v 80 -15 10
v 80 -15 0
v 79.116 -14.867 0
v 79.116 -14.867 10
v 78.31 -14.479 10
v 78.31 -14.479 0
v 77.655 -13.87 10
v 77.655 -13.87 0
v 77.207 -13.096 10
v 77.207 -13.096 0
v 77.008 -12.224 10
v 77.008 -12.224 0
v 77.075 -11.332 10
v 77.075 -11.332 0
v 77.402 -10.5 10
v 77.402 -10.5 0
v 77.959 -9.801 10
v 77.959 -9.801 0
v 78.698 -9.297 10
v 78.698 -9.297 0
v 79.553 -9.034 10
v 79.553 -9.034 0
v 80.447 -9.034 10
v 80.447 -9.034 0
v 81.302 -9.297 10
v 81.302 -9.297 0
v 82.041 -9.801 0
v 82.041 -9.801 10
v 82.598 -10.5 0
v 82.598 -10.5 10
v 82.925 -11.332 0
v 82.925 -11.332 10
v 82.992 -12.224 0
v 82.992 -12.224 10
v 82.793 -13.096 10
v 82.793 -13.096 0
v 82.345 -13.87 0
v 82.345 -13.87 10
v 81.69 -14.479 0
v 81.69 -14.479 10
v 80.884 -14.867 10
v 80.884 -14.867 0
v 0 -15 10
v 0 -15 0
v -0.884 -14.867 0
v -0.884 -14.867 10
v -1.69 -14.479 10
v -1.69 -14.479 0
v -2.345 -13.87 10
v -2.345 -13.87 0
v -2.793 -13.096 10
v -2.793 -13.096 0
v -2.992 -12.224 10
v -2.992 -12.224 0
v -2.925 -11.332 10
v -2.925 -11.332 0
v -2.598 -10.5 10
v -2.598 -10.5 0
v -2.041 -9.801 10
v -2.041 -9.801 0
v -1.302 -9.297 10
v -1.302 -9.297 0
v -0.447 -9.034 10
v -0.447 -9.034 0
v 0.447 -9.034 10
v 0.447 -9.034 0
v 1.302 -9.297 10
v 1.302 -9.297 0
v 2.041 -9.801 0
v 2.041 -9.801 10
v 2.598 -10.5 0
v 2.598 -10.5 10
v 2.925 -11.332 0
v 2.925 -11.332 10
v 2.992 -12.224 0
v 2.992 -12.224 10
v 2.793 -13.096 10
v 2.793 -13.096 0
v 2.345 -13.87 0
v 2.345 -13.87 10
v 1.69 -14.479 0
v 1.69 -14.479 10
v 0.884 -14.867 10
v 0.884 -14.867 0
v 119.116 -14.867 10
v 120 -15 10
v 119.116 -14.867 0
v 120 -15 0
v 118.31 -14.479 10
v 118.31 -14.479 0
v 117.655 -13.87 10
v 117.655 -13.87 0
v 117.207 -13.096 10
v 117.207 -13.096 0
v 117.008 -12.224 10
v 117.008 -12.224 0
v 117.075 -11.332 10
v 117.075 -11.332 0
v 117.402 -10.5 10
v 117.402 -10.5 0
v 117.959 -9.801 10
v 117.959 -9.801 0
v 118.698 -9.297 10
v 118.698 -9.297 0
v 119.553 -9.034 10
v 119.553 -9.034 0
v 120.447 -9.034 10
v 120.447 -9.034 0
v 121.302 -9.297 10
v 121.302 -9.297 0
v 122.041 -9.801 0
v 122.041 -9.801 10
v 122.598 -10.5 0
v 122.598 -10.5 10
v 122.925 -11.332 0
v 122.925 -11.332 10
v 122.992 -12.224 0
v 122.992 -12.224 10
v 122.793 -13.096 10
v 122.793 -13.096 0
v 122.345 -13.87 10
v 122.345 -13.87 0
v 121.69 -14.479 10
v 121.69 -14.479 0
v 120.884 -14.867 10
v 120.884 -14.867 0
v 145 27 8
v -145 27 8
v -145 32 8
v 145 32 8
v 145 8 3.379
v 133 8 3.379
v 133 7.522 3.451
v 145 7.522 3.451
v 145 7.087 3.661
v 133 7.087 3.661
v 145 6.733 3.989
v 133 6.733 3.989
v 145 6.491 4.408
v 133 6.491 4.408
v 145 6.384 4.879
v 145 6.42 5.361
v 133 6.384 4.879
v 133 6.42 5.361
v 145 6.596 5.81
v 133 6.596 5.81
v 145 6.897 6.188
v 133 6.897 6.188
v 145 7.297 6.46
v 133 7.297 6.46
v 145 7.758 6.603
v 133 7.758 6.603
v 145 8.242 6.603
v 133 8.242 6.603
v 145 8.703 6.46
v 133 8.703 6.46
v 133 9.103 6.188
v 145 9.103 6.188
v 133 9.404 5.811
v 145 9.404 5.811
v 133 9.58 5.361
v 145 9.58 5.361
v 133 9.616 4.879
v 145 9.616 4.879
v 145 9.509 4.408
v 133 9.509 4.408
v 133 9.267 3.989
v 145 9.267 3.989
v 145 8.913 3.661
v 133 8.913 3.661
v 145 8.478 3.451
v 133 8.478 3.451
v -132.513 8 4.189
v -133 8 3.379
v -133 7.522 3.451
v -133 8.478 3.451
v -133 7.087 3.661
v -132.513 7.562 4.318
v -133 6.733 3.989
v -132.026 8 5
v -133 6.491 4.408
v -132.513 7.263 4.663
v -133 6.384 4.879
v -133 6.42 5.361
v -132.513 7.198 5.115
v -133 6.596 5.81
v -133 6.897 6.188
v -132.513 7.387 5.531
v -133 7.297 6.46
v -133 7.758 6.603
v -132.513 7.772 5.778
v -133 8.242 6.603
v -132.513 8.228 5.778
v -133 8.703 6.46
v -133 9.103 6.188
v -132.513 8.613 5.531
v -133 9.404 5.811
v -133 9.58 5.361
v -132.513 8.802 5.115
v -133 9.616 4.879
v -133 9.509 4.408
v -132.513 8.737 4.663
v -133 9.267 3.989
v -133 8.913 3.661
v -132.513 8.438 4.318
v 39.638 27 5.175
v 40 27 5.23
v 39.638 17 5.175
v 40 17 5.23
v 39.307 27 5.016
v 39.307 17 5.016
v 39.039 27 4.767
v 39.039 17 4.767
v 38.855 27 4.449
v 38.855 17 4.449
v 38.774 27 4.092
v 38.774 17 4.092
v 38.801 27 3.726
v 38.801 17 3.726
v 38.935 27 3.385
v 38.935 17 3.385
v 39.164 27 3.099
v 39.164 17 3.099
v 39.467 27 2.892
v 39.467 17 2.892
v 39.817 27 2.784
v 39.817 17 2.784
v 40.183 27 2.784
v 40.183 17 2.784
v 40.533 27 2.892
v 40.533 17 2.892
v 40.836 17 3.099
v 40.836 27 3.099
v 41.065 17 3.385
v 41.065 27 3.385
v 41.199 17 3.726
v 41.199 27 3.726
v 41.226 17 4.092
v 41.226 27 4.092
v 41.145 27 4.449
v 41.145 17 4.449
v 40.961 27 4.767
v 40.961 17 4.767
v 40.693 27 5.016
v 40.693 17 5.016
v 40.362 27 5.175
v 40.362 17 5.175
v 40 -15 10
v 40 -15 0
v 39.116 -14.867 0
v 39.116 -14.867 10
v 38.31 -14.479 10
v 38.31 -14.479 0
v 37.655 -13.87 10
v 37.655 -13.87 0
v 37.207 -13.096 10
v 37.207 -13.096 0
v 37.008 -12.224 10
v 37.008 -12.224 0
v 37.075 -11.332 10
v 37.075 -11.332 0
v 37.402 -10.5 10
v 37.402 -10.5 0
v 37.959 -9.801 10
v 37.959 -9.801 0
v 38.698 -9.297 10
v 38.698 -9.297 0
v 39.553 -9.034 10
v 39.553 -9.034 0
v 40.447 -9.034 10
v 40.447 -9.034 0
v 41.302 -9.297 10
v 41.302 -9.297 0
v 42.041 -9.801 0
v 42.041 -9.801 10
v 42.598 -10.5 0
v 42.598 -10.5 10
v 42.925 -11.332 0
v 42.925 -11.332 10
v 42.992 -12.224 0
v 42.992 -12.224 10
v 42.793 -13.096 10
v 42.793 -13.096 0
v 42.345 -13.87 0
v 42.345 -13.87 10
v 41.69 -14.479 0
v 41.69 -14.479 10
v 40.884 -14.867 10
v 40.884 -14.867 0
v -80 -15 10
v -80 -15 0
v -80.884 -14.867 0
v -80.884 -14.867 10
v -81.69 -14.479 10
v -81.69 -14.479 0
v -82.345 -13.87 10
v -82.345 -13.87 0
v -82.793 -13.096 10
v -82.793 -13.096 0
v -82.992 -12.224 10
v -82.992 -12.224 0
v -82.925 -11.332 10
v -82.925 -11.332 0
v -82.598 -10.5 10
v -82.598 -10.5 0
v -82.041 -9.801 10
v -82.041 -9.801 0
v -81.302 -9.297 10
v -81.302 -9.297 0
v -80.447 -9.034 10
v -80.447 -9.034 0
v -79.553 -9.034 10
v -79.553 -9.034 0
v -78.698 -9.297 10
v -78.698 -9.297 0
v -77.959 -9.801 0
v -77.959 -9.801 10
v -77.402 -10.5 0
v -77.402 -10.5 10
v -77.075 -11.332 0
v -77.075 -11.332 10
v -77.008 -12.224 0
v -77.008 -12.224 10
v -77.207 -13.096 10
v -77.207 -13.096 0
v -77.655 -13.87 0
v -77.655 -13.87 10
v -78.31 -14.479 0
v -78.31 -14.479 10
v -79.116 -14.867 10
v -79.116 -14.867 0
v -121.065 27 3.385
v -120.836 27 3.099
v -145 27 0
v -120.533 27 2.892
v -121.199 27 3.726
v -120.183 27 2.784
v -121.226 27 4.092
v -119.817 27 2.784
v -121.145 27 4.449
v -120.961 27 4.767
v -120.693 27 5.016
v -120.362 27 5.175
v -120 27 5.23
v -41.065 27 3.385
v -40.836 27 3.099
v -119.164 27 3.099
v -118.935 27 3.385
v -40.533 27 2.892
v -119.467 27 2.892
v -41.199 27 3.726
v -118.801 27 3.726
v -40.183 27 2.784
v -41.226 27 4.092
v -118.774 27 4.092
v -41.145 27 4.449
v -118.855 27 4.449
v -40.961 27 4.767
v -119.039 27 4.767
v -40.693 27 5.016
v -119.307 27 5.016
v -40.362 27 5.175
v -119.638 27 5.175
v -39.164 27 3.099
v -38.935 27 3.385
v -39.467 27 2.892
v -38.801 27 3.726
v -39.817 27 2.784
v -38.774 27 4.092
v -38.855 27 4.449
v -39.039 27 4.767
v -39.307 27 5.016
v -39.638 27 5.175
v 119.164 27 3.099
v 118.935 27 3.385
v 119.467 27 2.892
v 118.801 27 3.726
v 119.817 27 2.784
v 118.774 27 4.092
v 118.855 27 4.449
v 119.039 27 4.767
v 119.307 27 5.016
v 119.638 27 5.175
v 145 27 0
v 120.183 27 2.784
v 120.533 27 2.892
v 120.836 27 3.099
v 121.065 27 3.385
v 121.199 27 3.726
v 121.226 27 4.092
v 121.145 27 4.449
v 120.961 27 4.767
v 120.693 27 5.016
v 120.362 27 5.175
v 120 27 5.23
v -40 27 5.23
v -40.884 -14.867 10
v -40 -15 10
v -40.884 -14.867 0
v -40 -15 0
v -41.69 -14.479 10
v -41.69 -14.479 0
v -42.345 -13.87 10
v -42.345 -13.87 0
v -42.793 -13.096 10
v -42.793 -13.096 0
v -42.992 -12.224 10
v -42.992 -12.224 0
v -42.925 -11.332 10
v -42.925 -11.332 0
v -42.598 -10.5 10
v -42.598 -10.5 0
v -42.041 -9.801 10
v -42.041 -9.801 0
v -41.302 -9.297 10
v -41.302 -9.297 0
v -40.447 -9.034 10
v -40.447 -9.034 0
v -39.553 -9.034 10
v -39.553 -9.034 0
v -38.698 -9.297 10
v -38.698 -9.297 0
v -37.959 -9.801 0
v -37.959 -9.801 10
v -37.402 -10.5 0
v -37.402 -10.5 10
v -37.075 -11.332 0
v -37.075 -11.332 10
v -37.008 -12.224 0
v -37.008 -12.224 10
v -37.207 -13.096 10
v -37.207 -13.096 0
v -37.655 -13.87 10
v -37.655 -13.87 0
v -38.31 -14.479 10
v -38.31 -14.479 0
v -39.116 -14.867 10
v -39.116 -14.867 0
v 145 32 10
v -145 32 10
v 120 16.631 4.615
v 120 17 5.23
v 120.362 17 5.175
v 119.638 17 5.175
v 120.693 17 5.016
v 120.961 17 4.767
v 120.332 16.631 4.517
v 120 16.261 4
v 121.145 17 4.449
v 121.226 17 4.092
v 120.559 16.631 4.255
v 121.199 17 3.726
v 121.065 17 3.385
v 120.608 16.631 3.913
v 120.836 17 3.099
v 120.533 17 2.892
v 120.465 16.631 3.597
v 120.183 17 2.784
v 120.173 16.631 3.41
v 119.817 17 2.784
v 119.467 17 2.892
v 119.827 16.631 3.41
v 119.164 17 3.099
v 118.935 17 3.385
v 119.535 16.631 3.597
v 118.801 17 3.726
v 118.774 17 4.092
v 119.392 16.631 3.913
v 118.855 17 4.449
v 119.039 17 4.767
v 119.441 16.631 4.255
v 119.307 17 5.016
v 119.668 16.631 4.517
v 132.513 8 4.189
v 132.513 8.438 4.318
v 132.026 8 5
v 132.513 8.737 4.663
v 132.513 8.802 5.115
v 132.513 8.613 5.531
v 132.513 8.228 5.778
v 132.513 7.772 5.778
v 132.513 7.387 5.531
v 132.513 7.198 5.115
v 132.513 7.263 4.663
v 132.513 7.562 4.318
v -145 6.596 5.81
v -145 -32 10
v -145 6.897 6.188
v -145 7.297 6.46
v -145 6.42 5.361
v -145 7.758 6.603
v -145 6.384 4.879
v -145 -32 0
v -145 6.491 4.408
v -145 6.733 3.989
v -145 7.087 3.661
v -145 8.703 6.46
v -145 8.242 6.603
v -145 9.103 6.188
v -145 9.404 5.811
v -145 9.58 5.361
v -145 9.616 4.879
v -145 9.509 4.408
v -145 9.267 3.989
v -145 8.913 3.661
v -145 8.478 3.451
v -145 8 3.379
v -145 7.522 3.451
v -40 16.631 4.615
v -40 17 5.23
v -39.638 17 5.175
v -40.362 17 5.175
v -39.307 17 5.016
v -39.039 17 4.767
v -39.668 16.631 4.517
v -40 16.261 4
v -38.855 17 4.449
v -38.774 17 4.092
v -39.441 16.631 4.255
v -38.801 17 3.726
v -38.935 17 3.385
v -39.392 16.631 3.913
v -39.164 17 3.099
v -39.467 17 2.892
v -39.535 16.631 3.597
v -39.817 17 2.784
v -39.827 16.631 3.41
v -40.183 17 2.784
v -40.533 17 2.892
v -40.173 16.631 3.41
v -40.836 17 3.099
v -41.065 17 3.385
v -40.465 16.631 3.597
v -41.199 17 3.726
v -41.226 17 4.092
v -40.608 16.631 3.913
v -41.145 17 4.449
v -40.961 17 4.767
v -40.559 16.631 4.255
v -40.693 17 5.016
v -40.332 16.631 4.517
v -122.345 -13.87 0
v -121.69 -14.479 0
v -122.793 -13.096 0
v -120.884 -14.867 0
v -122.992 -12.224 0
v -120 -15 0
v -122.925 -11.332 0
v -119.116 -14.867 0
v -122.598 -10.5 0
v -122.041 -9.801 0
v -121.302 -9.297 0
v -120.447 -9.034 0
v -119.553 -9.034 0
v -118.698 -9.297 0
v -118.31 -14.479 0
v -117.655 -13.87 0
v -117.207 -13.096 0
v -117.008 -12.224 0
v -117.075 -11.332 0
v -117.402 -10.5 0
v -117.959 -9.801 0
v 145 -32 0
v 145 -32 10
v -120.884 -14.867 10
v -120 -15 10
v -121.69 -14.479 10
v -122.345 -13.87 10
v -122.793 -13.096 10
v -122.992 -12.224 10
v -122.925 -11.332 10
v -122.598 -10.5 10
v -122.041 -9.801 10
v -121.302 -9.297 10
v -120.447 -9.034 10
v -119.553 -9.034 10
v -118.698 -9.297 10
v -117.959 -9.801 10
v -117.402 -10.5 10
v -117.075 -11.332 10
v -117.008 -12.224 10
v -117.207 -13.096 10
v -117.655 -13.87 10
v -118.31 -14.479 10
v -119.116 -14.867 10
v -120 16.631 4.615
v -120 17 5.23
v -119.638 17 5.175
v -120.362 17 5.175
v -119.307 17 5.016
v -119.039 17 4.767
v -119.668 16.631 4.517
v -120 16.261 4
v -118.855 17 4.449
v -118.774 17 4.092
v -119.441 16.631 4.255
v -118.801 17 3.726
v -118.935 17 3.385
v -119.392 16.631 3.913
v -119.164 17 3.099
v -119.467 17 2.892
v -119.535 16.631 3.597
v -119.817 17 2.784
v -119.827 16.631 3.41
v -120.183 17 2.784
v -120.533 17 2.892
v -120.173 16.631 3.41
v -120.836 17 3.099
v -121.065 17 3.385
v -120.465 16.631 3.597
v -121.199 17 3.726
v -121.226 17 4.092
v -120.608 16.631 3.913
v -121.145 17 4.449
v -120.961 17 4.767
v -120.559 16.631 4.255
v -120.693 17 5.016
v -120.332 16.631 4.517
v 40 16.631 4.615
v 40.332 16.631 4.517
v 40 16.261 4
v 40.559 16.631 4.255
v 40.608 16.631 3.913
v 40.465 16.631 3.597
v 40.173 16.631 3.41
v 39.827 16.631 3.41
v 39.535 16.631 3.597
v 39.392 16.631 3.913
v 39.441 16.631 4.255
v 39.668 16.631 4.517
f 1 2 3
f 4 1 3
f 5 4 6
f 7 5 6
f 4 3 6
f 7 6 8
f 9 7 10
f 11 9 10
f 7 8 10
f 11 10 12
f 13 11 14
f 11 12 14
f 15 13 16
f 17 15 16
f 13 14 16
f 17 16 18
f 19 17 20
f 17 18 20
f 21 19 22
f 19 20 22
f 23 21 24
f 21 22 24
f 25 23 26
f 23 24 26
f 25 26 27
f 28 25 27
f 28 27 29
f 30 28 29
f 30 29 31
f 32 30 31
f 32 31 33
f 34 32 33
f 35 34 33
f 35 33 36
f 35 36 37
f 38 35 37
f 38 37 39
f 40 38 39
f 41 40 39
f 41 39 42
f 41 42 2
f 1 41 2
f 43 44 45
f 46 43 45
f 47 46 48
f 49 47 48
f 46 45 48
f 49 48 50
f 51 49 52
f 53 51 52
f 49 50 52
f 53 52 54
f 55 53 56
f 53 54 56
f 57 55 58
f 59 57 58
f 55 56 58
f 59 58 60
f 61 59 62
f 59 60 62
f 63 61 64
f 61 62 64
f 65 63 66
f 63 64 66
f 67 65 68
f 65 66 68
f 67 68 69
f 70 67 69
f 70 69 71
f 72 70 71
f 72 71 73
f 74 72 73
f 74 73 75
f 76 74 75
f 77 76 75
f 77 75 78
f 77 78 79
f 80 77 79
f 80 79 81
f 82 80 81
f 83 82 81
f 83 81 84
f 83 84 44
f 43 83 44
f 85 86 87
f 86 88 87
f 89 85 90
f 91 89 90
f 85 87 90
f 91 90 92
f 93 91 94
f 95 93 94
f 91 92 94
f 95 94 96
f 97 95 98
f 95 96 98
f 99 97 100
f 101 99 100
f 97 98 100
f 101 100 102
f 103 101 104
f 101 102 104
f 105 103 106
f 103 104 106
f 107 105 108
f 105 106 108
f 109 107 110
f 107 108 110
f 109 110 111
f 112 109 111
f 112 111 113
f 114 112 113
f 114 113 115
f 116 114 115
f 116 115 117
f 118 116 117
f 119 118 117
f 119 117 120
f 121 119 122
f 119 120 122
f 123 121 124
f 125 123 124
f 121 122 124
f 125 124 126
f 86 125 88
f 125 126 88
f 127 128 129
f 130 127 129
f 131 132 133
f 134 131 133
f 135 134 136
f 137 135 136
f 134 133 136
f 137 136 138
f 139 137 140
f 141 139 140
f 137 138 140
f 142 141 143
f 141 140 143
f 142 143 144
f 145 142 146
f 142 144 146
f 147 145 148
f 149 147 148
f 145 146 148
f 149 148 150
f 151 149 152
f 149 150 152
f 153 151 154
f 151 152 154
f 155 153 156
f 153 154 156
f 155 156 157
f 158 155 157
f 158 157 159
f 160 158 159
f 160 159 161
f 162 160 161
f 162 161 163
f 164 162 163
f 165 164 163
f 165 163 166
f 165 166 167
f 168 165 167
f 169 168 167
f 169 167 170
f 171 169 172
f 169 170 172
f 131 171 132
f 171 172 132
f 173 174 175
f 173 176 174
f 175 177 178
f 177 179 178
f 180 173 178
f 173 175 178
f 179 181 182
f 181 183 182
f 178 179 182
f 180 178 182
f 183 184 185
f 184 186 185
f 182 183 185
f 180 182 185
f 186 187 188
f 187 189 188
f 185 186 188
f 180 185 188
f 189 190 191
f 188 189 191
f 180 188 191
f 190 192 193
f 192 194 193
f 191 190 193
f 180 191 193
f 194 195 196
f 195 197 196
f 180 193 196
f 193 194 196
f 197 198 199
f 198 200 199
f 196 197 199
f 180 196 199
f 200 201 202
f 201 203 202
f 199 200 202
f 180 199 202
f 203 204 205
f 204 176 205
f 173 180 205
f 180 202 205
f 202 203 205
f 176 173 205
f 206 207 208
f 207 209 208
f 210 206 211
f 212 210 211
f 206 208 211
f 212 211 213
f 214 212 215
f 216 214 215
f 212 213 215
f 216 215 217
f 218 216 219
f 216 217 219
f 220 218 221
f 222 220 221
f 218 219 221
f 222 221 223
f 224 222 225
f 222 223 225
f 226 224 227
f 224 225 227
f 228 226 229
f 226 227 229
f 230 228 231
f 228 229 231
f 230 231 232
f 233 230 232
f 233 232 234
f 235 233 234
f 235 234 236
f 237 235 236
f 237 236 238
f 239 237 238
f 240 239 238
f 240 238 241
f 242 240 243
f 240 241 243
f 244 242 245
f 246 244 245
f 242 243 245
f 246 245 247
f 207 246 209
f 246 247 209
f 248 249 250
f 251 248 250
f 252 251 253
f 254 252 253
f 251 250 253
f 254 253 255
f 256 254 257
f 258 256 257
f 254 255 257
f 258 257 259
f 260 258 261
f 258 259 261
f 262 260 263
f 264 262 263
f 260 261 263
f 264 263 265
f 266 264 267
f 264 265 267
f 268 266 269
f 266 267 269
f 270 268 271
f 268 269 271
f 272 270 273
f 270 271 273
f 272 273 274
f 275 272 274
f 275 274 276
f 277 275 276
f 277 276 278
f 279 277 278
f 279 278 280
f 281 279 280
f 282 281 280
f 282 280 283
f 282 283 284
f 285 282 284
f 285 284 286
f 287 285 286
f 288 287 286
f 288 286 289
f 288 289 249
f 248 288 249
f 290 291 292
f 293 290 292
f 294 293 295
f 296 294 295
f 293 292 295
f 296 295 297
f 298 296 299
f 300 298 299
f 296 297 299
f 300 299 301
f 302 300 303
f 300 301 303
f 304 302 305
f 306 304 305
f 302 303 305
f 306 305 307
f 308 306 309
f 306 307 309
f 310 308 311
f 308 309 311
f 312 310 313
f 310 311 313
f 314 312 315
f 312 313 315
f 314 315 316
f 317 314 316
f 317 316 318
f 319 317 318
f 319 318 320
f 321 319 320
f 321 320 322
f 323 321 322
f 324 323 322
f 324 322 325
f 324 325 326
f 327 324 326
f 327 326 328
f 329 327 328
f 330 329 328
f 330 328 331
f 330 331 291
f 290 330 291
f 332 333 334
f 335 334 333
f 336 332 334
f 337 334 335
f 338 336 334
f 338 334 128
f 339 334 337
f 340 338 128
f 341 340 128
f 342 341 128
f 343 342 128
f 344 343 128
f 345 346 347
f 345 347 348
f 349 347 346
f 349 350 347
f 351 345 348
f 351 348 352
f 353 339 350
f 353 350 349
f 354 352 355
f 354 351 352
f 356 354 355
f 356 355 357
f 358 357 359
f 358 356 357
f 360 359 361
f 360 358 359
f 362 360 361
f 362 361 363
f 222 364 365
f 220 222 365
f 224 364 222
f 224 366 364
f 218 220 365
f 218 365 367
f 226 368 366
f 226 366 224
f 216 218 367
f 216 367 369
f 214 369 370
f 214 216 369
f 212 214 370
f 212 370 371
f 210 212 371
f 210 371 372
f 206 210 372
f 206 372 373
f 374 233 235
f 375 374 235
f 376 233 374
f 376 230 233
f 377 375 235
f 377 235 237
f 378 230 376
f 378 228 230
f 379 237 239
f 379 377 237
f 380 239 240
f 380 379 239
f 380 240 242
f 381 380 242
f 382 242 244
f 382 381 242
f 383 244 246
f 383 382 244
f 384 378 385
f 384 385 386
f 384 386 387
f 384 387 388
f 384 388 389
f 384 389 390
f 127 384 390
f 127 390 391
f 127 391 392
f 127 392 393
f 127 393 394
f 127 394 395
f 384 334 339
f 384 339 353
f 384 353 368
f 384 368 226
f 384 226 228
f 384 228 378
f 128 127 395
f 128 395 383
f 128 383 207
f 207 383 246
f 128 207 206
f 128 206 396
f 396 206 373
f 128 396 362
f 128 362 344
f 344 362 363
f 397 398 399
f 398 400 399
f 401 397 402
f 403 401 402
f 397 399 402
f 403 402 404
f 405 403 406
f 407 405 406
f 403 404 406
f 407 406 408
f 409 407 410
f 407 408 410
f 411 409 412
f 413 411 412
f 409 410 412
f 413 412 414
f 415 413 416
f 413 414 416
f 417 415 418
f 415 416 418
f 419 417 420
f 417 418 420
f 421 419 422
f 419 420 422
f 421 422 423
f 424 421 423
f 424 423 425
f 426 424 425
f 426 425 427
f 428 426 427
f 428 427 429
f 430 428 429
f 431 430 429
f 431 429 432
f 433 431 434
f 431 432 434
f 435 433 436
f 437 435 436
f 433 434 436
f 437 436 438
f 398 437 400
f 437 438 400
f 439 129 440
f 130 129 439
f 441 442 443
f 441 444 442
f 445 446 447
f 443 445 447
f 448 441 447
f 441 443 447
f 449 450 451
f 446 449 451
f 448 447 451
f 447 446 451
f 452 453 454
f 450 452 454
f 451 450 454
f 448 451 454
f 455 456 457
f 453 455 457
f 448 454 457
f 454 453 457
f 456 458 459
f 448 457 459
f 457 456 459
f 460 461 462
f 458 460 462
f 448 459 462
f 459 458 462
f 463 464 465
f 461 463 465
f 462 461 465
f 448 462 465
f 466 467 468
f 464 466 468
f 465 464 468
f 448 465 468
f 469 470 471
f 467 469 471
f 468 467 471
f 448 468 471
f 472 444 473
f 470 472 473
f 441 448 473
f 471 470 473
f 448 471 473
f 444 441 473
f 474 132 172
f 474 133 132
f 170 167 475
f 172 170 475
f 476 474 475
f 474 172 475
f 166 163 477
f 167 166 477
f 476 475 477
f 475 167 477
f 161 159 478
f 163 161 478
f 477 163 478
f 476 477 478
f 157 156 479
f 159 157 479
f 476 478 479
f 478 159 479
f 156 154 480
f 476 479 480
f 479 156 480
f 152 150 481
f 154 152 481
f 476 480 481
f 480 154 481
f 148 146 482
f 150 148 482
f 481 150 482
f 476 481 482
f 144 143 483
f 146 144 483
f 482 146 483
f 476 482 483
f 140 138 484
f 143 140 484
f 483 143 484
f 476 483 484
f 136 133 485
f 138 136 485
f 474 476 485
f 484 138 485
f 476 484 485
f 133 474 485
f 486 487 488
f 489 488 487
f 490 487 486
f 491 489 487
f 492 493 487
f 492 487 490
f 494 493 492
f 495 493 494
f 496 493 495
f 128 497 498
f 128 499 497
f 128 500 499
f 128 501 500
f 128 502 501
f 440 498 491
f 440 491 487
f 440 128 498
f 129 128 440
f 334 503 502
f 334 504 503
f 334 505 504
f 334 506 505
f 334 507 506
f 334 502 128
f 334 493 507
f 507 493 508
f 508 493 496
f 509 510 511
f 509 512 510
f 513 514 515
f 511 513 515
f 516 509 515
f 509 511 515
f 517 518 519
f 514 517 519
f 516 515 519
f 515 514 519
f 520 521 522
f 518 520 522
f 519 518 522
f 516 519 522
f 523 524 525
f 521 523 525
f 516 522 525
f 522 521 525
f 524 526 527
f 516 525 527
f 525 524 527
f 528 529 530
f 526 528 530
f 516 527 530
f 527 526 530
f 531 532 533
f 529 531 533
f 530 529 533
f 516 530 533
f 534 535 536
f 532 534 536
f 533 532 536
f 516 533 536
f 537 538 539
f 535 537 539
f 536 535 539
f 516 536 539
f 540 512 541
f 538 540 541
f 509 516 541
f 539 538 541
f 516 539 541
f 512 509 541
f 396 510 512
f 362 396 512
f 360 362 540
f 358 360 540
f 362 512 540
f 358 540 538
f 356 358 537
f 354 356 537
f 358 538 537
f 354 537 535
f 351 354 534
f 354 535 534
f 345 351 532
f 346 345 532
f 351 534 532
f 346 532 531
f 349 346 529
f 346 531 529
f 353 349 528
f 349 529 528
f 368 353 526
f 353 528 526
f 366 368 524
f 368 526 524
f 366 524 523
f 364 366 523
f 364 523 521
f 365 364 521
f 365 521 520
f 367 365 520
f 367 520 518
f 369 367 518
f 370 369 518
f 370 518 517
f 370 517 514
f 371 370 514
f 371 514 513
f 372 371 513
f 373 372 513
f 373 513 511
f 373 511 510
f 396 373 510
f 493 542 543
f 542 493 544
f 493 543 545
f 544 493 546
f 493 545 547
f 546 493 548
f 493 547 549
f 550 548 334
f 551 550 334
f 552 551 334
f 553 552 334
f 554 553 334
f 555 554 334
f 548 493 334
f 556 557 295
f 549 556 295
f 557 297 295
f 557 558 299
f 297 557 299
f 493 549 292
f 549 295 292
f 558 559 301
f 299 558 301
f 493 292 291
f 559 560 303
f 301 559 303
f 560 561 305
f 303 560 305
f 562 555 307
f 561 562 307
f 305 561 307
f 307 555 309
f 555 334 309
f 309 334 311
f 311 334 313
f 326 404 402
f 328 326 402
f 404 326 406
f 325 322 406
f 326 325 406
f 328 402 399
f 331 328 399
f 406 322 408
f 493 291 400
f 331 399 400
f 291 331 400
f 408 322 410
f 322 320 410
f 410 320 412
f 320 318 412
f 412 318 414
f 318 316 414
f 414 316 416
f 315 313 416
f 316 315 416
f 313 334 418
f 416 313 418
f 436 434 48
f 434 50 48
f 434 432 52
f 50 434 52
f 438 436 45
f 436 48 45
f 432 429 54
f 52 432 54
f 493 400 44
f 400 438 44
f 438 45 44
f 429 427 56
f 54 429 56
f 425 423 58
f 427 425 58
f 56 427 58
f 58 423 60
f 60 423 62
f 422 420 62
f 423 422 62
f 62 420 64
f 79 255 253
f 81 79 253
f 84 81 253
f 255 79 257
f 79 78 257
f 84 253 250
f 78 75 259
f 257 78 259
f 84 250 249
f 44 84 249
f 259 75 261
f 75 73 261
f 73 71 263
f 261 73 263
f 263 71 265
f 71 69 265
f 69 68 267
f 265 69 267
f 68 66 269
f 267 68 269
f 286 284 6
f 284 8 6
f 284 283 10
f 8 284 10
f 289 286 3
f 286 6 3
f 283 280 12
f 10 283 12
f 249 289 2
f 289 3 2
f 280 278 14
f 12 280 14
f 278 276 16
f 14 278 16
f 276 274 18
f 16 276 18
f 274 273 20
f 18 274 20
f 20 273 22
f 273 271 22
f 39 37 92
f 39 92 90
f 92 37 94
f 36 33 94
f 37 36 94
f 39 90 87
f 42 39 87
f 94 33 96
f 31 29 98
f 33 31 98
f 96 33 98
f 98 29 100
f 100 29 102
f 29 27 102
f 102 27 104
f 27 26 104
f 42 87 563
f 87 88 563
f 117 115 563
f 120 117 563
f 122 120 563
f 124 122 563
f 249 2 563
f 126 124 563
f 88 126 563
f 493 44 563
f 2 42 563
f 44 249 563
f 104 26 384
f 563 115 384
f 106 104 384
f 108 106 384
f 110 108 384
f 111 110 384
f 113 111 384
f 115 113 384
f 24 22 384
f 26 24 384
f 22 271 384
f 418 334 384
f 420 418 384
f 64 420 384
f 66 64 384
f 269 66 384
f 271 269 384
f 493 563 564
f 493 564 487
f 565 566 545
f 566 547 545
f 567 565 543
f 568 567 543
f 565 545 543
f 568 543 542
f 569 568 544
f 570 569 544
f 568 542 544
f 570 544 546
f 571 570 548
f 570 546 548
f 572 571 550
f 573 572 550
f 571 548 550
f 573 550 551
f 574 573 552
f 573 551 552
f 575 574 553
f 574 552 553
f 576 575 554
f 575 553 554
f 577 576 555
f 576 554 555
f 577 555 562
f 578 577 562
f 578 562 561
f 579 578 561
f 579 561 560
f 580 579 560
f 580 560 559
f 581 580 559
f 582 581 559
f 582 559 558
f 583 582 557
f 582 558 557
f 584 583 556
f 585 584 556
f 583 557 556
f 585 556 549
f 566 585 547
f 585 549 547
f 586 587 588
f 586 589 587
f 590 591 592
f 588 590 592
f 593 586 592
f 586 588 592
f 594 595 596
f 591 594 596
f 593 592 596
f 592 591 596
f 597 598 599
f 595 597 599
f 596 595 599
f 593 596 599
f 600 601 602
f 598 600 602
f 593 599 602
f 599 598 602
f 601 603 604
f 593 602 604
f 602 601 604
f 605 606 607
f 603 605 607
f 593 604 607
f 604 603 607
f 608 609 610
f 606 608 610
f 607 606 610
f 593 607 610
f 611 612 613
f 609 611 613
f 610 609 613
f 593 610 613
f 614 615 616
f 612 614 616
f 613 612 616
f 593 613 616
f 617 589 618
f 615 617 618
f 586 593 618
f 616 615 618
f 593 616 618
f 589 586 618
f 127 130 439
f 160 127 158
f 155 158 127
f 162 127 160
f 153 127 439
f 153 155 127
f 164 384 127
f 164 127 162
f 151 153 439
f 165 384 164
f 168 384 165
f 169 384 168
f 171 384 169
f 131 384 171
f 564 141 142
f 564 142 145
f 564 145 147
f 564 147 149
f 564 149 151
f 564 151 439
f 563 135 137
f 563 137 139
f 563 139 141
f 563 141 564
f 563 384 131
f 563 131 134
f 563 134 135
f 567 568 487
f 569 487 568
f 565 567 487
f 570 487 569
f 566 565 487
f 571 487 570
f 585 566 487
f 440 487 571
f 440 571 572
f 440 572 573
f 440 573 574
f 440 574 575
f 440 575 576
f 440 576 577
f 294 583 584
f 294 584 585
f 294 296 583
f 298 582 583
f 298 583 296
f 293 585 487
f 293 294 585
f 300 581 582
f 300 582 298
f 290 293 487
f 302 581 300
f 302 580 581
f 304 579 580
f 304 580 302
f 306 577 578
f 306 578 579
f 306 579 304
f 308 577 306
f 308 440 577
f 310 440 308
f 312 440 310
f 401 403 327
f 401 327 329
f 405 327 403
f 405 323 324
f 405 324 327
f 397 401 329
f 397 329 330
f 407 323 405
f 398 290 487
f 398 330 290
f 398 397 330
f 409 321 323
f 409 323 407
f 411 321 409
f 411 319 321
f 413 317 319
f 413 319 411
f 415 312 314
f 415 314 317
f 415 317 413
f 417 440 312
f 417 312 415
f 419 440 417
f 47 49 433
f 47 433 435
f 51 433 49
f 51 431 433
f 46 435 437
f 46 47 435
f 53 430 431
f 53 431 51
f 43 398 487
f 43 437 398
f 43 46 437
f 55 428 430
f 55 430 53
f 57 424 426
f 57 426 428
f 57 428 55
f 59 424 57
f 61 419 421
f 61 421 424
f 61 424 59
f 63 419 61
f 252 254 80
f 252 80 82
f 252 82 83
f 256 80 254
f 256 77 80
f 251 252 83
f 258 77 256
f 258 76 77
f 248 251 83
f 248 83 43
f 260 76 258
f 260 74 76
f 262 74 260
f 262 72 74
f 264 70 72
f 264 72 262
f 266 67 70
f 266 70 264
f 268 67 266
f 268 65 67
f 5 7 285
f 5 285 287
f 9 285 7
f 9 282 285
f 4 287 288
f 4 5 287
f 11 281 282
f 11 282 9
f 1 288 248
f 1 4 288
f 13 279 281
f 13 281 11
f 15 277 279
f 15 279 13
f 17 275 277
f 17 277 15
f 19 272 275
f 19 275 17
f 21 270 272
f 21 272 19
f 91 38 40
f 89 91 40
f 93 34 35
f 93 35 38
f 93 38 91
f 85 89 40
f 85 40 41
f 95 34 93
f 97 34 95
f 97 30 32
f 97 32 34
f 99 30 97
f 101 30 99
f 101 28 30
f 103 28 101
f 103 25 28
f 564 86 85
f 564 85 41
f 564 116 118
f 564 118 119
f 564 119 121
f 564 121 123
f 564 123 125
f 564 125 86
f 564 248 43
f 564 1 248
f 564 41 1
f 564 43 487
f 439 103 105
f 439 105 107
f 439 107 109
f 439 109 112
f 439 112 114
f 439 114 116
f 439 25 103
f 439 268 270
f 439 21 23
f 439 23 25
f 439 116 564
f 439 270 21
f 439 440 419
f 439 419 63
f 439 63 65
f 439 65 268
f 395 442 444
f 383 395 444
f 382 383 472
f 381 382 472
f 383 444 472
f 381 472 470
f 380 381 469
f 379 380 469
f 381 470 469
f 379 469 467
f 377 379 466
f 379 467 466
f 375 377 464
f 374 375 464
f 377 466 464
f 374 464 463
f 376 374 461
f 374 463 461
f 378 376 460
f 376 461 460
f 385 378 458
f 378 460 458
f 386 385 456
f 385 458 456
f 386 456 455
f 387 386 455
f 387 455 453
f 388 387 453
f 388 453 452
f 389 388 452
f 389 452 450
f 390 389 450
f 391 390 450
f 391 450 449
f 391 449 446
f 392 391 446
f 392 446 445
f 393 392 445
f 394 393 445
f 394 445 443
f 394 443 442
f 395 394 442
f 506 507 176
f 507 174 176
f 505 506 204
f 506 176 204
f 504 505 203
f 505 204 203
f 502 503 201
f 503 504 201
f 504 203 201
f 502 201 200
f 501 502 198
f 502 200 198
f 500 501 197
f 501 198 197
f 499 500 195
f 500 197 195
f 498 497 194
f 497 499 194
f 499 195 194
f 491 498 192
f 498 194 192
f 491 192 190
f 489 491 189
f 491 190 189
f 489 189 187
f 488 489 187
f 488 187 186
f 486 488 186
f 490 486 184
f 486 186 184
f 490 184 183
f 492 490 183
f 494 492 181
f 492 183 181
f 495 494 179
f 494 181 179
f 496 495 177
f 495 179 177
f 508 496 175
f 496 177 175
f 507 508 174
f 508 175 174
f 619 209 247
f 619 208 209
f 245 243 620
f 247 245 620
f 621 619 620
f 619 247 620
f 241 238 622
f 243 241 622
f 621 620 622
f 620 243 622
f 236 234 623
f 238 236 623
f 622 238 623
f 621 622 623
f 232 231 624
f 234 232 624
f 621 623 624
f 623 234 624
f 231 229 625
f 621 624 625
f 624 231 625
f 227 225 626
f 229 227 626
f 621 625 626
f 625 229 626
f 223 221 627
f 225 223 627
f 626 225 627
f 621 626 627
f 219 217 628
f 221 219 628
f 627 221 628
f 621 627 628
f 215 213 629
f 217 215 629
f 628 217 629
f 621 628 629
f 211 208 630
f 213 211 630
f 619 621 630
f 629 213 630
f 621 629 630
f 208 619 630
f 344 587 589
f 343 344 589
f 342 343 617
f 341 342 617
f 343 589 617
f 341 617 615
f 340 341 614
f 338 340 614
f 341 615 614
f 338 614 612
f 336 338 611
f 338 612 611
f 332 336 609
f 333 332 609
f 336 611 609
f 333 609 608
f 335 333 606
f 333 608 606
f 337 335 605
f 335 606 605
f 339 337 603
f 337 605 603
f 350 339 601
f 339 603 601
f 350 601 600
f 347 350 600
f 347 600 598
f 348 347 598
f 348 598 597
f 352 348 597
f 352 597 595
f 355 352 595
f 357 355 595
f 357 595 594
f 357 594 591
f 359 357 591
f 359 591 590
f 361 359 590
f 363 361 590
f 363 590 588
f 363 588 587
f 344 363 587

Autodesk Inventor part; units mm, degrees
ref_plane "YZ Plane" through (0, 0, 0) normal (1, 0, 0) x (0, 1, 0)
ref_plane "XZ Plane" through (0, 0, 0) normal (0, 1, 0) x (-1, 0, 0)
ref_plane "XY Plane" through (0, 0, 0) normal (0, 0, 1) x (1, 0, 0)
sketch "Skizze1" plane through (0, 0, 0) normal (0, 0, 1) x (1, 0, 0)
  line L0 (0, 44.8) -> (0, -44.8) projected
  line L1 (-203, 0) -> (203, 0) projected
  line L2 (-145, 32) -> (145, 32)
  line L3 (145, 32) -> (145, -32)
  line L4 (145, -32) -> (-145, -32)
  line L5 (-145, -32) -> (-145, 32)
  point P0 (0, 0)
  point P1 (0, 32)
  point P2 (-145, 0)
  dimension "d0" = 290
  dimension "d1" = 64
extrude "Extrusion1" add sketch "Skizze1" along normal blind 10
sketch "Skizze2" plane through (145, -32, 0) normal (1, 0, 0) x (0, 0, -1)
  line L0 (-10, 64) -> (-10, 0) projected
  line L1 (0, 0) -> (0, 64) projected
  line L2 (0, 64) -> (-10, 64) projected
  line L3 (0, 59) -> (-8, 59)
  line L4 (-8, 59) -> (-8, 64)
  point P0 (0, 32)
  dimension "d4" = 2
  dimension "d5" = 5
extrude "Extrusion2" cut sketch "Skizze2" against normal through all
sketch "Skizze3" plane through (0, 0, 10) normal (0, 0, 1) x (1, 0, 0)
  line L0 (-145, -32) -> (-145, 32) projected
  line L1 (145, -32) -> (-145, -32) projected
  point P0 (0, 0)
  point P1 (-120, -12)
  dimension "d8" = 25
  dimension "d9" = 20
hole "Bohrung1" at (-120, -12, 10) direction (0, 0, -1) diameter 6 end through all
pattern_linear "Rechteckige Anordnung1" count 7 spacing 40 along (1, 0, 0) of "Bohrung1"
sketch "Skizze4" plane through (145, 27, 8) normal (0, 1, 0) x (1, 0, 0)
  line L0 (-290, 0) -> (-290, 8) projected
  line L1 (-290, 8) -> (0, 8) projected
  point P0 (-145, 8)
  point P1 (-265, 4)
  dimension "d20" = 25
  dimension "d21" = 4
hole "Bohrung2" at (-120, 27, 4) direction (0, -1, 0) diameter 2.459 depth 10 tip angle 118 thread size "M3x0.5" class "6H" standard "ISO Metric profile"
pattern_linear "Rechteckige Anordnung2" count 4 spacing 80 along (1, 0, 0) of "Bohrung2"
sketch "Skizze5" plane through (145, -32, 10) normal (1, 0, 0) x (0, 0, -1)
  line L0 (10, 0) -> (0, 0) projected
  point P0 (10, 32)
  point P1 (5, 40)
  dimension "d32" = 40
hole "Bohrung3" at (145, 8, 5) direction (-1, 0, 0) diameter 3.242 depth 12 tip angle 118 thread size "M4x0.7" class "6H" standard "ISO Metric profile"
mirror "Spiegeln1" about plane through (0, 0, 0) normal (1, 0, 0) of "Bohrung3"
properties part number "Tunnelwand" material "Polycarbonate, Clear"
